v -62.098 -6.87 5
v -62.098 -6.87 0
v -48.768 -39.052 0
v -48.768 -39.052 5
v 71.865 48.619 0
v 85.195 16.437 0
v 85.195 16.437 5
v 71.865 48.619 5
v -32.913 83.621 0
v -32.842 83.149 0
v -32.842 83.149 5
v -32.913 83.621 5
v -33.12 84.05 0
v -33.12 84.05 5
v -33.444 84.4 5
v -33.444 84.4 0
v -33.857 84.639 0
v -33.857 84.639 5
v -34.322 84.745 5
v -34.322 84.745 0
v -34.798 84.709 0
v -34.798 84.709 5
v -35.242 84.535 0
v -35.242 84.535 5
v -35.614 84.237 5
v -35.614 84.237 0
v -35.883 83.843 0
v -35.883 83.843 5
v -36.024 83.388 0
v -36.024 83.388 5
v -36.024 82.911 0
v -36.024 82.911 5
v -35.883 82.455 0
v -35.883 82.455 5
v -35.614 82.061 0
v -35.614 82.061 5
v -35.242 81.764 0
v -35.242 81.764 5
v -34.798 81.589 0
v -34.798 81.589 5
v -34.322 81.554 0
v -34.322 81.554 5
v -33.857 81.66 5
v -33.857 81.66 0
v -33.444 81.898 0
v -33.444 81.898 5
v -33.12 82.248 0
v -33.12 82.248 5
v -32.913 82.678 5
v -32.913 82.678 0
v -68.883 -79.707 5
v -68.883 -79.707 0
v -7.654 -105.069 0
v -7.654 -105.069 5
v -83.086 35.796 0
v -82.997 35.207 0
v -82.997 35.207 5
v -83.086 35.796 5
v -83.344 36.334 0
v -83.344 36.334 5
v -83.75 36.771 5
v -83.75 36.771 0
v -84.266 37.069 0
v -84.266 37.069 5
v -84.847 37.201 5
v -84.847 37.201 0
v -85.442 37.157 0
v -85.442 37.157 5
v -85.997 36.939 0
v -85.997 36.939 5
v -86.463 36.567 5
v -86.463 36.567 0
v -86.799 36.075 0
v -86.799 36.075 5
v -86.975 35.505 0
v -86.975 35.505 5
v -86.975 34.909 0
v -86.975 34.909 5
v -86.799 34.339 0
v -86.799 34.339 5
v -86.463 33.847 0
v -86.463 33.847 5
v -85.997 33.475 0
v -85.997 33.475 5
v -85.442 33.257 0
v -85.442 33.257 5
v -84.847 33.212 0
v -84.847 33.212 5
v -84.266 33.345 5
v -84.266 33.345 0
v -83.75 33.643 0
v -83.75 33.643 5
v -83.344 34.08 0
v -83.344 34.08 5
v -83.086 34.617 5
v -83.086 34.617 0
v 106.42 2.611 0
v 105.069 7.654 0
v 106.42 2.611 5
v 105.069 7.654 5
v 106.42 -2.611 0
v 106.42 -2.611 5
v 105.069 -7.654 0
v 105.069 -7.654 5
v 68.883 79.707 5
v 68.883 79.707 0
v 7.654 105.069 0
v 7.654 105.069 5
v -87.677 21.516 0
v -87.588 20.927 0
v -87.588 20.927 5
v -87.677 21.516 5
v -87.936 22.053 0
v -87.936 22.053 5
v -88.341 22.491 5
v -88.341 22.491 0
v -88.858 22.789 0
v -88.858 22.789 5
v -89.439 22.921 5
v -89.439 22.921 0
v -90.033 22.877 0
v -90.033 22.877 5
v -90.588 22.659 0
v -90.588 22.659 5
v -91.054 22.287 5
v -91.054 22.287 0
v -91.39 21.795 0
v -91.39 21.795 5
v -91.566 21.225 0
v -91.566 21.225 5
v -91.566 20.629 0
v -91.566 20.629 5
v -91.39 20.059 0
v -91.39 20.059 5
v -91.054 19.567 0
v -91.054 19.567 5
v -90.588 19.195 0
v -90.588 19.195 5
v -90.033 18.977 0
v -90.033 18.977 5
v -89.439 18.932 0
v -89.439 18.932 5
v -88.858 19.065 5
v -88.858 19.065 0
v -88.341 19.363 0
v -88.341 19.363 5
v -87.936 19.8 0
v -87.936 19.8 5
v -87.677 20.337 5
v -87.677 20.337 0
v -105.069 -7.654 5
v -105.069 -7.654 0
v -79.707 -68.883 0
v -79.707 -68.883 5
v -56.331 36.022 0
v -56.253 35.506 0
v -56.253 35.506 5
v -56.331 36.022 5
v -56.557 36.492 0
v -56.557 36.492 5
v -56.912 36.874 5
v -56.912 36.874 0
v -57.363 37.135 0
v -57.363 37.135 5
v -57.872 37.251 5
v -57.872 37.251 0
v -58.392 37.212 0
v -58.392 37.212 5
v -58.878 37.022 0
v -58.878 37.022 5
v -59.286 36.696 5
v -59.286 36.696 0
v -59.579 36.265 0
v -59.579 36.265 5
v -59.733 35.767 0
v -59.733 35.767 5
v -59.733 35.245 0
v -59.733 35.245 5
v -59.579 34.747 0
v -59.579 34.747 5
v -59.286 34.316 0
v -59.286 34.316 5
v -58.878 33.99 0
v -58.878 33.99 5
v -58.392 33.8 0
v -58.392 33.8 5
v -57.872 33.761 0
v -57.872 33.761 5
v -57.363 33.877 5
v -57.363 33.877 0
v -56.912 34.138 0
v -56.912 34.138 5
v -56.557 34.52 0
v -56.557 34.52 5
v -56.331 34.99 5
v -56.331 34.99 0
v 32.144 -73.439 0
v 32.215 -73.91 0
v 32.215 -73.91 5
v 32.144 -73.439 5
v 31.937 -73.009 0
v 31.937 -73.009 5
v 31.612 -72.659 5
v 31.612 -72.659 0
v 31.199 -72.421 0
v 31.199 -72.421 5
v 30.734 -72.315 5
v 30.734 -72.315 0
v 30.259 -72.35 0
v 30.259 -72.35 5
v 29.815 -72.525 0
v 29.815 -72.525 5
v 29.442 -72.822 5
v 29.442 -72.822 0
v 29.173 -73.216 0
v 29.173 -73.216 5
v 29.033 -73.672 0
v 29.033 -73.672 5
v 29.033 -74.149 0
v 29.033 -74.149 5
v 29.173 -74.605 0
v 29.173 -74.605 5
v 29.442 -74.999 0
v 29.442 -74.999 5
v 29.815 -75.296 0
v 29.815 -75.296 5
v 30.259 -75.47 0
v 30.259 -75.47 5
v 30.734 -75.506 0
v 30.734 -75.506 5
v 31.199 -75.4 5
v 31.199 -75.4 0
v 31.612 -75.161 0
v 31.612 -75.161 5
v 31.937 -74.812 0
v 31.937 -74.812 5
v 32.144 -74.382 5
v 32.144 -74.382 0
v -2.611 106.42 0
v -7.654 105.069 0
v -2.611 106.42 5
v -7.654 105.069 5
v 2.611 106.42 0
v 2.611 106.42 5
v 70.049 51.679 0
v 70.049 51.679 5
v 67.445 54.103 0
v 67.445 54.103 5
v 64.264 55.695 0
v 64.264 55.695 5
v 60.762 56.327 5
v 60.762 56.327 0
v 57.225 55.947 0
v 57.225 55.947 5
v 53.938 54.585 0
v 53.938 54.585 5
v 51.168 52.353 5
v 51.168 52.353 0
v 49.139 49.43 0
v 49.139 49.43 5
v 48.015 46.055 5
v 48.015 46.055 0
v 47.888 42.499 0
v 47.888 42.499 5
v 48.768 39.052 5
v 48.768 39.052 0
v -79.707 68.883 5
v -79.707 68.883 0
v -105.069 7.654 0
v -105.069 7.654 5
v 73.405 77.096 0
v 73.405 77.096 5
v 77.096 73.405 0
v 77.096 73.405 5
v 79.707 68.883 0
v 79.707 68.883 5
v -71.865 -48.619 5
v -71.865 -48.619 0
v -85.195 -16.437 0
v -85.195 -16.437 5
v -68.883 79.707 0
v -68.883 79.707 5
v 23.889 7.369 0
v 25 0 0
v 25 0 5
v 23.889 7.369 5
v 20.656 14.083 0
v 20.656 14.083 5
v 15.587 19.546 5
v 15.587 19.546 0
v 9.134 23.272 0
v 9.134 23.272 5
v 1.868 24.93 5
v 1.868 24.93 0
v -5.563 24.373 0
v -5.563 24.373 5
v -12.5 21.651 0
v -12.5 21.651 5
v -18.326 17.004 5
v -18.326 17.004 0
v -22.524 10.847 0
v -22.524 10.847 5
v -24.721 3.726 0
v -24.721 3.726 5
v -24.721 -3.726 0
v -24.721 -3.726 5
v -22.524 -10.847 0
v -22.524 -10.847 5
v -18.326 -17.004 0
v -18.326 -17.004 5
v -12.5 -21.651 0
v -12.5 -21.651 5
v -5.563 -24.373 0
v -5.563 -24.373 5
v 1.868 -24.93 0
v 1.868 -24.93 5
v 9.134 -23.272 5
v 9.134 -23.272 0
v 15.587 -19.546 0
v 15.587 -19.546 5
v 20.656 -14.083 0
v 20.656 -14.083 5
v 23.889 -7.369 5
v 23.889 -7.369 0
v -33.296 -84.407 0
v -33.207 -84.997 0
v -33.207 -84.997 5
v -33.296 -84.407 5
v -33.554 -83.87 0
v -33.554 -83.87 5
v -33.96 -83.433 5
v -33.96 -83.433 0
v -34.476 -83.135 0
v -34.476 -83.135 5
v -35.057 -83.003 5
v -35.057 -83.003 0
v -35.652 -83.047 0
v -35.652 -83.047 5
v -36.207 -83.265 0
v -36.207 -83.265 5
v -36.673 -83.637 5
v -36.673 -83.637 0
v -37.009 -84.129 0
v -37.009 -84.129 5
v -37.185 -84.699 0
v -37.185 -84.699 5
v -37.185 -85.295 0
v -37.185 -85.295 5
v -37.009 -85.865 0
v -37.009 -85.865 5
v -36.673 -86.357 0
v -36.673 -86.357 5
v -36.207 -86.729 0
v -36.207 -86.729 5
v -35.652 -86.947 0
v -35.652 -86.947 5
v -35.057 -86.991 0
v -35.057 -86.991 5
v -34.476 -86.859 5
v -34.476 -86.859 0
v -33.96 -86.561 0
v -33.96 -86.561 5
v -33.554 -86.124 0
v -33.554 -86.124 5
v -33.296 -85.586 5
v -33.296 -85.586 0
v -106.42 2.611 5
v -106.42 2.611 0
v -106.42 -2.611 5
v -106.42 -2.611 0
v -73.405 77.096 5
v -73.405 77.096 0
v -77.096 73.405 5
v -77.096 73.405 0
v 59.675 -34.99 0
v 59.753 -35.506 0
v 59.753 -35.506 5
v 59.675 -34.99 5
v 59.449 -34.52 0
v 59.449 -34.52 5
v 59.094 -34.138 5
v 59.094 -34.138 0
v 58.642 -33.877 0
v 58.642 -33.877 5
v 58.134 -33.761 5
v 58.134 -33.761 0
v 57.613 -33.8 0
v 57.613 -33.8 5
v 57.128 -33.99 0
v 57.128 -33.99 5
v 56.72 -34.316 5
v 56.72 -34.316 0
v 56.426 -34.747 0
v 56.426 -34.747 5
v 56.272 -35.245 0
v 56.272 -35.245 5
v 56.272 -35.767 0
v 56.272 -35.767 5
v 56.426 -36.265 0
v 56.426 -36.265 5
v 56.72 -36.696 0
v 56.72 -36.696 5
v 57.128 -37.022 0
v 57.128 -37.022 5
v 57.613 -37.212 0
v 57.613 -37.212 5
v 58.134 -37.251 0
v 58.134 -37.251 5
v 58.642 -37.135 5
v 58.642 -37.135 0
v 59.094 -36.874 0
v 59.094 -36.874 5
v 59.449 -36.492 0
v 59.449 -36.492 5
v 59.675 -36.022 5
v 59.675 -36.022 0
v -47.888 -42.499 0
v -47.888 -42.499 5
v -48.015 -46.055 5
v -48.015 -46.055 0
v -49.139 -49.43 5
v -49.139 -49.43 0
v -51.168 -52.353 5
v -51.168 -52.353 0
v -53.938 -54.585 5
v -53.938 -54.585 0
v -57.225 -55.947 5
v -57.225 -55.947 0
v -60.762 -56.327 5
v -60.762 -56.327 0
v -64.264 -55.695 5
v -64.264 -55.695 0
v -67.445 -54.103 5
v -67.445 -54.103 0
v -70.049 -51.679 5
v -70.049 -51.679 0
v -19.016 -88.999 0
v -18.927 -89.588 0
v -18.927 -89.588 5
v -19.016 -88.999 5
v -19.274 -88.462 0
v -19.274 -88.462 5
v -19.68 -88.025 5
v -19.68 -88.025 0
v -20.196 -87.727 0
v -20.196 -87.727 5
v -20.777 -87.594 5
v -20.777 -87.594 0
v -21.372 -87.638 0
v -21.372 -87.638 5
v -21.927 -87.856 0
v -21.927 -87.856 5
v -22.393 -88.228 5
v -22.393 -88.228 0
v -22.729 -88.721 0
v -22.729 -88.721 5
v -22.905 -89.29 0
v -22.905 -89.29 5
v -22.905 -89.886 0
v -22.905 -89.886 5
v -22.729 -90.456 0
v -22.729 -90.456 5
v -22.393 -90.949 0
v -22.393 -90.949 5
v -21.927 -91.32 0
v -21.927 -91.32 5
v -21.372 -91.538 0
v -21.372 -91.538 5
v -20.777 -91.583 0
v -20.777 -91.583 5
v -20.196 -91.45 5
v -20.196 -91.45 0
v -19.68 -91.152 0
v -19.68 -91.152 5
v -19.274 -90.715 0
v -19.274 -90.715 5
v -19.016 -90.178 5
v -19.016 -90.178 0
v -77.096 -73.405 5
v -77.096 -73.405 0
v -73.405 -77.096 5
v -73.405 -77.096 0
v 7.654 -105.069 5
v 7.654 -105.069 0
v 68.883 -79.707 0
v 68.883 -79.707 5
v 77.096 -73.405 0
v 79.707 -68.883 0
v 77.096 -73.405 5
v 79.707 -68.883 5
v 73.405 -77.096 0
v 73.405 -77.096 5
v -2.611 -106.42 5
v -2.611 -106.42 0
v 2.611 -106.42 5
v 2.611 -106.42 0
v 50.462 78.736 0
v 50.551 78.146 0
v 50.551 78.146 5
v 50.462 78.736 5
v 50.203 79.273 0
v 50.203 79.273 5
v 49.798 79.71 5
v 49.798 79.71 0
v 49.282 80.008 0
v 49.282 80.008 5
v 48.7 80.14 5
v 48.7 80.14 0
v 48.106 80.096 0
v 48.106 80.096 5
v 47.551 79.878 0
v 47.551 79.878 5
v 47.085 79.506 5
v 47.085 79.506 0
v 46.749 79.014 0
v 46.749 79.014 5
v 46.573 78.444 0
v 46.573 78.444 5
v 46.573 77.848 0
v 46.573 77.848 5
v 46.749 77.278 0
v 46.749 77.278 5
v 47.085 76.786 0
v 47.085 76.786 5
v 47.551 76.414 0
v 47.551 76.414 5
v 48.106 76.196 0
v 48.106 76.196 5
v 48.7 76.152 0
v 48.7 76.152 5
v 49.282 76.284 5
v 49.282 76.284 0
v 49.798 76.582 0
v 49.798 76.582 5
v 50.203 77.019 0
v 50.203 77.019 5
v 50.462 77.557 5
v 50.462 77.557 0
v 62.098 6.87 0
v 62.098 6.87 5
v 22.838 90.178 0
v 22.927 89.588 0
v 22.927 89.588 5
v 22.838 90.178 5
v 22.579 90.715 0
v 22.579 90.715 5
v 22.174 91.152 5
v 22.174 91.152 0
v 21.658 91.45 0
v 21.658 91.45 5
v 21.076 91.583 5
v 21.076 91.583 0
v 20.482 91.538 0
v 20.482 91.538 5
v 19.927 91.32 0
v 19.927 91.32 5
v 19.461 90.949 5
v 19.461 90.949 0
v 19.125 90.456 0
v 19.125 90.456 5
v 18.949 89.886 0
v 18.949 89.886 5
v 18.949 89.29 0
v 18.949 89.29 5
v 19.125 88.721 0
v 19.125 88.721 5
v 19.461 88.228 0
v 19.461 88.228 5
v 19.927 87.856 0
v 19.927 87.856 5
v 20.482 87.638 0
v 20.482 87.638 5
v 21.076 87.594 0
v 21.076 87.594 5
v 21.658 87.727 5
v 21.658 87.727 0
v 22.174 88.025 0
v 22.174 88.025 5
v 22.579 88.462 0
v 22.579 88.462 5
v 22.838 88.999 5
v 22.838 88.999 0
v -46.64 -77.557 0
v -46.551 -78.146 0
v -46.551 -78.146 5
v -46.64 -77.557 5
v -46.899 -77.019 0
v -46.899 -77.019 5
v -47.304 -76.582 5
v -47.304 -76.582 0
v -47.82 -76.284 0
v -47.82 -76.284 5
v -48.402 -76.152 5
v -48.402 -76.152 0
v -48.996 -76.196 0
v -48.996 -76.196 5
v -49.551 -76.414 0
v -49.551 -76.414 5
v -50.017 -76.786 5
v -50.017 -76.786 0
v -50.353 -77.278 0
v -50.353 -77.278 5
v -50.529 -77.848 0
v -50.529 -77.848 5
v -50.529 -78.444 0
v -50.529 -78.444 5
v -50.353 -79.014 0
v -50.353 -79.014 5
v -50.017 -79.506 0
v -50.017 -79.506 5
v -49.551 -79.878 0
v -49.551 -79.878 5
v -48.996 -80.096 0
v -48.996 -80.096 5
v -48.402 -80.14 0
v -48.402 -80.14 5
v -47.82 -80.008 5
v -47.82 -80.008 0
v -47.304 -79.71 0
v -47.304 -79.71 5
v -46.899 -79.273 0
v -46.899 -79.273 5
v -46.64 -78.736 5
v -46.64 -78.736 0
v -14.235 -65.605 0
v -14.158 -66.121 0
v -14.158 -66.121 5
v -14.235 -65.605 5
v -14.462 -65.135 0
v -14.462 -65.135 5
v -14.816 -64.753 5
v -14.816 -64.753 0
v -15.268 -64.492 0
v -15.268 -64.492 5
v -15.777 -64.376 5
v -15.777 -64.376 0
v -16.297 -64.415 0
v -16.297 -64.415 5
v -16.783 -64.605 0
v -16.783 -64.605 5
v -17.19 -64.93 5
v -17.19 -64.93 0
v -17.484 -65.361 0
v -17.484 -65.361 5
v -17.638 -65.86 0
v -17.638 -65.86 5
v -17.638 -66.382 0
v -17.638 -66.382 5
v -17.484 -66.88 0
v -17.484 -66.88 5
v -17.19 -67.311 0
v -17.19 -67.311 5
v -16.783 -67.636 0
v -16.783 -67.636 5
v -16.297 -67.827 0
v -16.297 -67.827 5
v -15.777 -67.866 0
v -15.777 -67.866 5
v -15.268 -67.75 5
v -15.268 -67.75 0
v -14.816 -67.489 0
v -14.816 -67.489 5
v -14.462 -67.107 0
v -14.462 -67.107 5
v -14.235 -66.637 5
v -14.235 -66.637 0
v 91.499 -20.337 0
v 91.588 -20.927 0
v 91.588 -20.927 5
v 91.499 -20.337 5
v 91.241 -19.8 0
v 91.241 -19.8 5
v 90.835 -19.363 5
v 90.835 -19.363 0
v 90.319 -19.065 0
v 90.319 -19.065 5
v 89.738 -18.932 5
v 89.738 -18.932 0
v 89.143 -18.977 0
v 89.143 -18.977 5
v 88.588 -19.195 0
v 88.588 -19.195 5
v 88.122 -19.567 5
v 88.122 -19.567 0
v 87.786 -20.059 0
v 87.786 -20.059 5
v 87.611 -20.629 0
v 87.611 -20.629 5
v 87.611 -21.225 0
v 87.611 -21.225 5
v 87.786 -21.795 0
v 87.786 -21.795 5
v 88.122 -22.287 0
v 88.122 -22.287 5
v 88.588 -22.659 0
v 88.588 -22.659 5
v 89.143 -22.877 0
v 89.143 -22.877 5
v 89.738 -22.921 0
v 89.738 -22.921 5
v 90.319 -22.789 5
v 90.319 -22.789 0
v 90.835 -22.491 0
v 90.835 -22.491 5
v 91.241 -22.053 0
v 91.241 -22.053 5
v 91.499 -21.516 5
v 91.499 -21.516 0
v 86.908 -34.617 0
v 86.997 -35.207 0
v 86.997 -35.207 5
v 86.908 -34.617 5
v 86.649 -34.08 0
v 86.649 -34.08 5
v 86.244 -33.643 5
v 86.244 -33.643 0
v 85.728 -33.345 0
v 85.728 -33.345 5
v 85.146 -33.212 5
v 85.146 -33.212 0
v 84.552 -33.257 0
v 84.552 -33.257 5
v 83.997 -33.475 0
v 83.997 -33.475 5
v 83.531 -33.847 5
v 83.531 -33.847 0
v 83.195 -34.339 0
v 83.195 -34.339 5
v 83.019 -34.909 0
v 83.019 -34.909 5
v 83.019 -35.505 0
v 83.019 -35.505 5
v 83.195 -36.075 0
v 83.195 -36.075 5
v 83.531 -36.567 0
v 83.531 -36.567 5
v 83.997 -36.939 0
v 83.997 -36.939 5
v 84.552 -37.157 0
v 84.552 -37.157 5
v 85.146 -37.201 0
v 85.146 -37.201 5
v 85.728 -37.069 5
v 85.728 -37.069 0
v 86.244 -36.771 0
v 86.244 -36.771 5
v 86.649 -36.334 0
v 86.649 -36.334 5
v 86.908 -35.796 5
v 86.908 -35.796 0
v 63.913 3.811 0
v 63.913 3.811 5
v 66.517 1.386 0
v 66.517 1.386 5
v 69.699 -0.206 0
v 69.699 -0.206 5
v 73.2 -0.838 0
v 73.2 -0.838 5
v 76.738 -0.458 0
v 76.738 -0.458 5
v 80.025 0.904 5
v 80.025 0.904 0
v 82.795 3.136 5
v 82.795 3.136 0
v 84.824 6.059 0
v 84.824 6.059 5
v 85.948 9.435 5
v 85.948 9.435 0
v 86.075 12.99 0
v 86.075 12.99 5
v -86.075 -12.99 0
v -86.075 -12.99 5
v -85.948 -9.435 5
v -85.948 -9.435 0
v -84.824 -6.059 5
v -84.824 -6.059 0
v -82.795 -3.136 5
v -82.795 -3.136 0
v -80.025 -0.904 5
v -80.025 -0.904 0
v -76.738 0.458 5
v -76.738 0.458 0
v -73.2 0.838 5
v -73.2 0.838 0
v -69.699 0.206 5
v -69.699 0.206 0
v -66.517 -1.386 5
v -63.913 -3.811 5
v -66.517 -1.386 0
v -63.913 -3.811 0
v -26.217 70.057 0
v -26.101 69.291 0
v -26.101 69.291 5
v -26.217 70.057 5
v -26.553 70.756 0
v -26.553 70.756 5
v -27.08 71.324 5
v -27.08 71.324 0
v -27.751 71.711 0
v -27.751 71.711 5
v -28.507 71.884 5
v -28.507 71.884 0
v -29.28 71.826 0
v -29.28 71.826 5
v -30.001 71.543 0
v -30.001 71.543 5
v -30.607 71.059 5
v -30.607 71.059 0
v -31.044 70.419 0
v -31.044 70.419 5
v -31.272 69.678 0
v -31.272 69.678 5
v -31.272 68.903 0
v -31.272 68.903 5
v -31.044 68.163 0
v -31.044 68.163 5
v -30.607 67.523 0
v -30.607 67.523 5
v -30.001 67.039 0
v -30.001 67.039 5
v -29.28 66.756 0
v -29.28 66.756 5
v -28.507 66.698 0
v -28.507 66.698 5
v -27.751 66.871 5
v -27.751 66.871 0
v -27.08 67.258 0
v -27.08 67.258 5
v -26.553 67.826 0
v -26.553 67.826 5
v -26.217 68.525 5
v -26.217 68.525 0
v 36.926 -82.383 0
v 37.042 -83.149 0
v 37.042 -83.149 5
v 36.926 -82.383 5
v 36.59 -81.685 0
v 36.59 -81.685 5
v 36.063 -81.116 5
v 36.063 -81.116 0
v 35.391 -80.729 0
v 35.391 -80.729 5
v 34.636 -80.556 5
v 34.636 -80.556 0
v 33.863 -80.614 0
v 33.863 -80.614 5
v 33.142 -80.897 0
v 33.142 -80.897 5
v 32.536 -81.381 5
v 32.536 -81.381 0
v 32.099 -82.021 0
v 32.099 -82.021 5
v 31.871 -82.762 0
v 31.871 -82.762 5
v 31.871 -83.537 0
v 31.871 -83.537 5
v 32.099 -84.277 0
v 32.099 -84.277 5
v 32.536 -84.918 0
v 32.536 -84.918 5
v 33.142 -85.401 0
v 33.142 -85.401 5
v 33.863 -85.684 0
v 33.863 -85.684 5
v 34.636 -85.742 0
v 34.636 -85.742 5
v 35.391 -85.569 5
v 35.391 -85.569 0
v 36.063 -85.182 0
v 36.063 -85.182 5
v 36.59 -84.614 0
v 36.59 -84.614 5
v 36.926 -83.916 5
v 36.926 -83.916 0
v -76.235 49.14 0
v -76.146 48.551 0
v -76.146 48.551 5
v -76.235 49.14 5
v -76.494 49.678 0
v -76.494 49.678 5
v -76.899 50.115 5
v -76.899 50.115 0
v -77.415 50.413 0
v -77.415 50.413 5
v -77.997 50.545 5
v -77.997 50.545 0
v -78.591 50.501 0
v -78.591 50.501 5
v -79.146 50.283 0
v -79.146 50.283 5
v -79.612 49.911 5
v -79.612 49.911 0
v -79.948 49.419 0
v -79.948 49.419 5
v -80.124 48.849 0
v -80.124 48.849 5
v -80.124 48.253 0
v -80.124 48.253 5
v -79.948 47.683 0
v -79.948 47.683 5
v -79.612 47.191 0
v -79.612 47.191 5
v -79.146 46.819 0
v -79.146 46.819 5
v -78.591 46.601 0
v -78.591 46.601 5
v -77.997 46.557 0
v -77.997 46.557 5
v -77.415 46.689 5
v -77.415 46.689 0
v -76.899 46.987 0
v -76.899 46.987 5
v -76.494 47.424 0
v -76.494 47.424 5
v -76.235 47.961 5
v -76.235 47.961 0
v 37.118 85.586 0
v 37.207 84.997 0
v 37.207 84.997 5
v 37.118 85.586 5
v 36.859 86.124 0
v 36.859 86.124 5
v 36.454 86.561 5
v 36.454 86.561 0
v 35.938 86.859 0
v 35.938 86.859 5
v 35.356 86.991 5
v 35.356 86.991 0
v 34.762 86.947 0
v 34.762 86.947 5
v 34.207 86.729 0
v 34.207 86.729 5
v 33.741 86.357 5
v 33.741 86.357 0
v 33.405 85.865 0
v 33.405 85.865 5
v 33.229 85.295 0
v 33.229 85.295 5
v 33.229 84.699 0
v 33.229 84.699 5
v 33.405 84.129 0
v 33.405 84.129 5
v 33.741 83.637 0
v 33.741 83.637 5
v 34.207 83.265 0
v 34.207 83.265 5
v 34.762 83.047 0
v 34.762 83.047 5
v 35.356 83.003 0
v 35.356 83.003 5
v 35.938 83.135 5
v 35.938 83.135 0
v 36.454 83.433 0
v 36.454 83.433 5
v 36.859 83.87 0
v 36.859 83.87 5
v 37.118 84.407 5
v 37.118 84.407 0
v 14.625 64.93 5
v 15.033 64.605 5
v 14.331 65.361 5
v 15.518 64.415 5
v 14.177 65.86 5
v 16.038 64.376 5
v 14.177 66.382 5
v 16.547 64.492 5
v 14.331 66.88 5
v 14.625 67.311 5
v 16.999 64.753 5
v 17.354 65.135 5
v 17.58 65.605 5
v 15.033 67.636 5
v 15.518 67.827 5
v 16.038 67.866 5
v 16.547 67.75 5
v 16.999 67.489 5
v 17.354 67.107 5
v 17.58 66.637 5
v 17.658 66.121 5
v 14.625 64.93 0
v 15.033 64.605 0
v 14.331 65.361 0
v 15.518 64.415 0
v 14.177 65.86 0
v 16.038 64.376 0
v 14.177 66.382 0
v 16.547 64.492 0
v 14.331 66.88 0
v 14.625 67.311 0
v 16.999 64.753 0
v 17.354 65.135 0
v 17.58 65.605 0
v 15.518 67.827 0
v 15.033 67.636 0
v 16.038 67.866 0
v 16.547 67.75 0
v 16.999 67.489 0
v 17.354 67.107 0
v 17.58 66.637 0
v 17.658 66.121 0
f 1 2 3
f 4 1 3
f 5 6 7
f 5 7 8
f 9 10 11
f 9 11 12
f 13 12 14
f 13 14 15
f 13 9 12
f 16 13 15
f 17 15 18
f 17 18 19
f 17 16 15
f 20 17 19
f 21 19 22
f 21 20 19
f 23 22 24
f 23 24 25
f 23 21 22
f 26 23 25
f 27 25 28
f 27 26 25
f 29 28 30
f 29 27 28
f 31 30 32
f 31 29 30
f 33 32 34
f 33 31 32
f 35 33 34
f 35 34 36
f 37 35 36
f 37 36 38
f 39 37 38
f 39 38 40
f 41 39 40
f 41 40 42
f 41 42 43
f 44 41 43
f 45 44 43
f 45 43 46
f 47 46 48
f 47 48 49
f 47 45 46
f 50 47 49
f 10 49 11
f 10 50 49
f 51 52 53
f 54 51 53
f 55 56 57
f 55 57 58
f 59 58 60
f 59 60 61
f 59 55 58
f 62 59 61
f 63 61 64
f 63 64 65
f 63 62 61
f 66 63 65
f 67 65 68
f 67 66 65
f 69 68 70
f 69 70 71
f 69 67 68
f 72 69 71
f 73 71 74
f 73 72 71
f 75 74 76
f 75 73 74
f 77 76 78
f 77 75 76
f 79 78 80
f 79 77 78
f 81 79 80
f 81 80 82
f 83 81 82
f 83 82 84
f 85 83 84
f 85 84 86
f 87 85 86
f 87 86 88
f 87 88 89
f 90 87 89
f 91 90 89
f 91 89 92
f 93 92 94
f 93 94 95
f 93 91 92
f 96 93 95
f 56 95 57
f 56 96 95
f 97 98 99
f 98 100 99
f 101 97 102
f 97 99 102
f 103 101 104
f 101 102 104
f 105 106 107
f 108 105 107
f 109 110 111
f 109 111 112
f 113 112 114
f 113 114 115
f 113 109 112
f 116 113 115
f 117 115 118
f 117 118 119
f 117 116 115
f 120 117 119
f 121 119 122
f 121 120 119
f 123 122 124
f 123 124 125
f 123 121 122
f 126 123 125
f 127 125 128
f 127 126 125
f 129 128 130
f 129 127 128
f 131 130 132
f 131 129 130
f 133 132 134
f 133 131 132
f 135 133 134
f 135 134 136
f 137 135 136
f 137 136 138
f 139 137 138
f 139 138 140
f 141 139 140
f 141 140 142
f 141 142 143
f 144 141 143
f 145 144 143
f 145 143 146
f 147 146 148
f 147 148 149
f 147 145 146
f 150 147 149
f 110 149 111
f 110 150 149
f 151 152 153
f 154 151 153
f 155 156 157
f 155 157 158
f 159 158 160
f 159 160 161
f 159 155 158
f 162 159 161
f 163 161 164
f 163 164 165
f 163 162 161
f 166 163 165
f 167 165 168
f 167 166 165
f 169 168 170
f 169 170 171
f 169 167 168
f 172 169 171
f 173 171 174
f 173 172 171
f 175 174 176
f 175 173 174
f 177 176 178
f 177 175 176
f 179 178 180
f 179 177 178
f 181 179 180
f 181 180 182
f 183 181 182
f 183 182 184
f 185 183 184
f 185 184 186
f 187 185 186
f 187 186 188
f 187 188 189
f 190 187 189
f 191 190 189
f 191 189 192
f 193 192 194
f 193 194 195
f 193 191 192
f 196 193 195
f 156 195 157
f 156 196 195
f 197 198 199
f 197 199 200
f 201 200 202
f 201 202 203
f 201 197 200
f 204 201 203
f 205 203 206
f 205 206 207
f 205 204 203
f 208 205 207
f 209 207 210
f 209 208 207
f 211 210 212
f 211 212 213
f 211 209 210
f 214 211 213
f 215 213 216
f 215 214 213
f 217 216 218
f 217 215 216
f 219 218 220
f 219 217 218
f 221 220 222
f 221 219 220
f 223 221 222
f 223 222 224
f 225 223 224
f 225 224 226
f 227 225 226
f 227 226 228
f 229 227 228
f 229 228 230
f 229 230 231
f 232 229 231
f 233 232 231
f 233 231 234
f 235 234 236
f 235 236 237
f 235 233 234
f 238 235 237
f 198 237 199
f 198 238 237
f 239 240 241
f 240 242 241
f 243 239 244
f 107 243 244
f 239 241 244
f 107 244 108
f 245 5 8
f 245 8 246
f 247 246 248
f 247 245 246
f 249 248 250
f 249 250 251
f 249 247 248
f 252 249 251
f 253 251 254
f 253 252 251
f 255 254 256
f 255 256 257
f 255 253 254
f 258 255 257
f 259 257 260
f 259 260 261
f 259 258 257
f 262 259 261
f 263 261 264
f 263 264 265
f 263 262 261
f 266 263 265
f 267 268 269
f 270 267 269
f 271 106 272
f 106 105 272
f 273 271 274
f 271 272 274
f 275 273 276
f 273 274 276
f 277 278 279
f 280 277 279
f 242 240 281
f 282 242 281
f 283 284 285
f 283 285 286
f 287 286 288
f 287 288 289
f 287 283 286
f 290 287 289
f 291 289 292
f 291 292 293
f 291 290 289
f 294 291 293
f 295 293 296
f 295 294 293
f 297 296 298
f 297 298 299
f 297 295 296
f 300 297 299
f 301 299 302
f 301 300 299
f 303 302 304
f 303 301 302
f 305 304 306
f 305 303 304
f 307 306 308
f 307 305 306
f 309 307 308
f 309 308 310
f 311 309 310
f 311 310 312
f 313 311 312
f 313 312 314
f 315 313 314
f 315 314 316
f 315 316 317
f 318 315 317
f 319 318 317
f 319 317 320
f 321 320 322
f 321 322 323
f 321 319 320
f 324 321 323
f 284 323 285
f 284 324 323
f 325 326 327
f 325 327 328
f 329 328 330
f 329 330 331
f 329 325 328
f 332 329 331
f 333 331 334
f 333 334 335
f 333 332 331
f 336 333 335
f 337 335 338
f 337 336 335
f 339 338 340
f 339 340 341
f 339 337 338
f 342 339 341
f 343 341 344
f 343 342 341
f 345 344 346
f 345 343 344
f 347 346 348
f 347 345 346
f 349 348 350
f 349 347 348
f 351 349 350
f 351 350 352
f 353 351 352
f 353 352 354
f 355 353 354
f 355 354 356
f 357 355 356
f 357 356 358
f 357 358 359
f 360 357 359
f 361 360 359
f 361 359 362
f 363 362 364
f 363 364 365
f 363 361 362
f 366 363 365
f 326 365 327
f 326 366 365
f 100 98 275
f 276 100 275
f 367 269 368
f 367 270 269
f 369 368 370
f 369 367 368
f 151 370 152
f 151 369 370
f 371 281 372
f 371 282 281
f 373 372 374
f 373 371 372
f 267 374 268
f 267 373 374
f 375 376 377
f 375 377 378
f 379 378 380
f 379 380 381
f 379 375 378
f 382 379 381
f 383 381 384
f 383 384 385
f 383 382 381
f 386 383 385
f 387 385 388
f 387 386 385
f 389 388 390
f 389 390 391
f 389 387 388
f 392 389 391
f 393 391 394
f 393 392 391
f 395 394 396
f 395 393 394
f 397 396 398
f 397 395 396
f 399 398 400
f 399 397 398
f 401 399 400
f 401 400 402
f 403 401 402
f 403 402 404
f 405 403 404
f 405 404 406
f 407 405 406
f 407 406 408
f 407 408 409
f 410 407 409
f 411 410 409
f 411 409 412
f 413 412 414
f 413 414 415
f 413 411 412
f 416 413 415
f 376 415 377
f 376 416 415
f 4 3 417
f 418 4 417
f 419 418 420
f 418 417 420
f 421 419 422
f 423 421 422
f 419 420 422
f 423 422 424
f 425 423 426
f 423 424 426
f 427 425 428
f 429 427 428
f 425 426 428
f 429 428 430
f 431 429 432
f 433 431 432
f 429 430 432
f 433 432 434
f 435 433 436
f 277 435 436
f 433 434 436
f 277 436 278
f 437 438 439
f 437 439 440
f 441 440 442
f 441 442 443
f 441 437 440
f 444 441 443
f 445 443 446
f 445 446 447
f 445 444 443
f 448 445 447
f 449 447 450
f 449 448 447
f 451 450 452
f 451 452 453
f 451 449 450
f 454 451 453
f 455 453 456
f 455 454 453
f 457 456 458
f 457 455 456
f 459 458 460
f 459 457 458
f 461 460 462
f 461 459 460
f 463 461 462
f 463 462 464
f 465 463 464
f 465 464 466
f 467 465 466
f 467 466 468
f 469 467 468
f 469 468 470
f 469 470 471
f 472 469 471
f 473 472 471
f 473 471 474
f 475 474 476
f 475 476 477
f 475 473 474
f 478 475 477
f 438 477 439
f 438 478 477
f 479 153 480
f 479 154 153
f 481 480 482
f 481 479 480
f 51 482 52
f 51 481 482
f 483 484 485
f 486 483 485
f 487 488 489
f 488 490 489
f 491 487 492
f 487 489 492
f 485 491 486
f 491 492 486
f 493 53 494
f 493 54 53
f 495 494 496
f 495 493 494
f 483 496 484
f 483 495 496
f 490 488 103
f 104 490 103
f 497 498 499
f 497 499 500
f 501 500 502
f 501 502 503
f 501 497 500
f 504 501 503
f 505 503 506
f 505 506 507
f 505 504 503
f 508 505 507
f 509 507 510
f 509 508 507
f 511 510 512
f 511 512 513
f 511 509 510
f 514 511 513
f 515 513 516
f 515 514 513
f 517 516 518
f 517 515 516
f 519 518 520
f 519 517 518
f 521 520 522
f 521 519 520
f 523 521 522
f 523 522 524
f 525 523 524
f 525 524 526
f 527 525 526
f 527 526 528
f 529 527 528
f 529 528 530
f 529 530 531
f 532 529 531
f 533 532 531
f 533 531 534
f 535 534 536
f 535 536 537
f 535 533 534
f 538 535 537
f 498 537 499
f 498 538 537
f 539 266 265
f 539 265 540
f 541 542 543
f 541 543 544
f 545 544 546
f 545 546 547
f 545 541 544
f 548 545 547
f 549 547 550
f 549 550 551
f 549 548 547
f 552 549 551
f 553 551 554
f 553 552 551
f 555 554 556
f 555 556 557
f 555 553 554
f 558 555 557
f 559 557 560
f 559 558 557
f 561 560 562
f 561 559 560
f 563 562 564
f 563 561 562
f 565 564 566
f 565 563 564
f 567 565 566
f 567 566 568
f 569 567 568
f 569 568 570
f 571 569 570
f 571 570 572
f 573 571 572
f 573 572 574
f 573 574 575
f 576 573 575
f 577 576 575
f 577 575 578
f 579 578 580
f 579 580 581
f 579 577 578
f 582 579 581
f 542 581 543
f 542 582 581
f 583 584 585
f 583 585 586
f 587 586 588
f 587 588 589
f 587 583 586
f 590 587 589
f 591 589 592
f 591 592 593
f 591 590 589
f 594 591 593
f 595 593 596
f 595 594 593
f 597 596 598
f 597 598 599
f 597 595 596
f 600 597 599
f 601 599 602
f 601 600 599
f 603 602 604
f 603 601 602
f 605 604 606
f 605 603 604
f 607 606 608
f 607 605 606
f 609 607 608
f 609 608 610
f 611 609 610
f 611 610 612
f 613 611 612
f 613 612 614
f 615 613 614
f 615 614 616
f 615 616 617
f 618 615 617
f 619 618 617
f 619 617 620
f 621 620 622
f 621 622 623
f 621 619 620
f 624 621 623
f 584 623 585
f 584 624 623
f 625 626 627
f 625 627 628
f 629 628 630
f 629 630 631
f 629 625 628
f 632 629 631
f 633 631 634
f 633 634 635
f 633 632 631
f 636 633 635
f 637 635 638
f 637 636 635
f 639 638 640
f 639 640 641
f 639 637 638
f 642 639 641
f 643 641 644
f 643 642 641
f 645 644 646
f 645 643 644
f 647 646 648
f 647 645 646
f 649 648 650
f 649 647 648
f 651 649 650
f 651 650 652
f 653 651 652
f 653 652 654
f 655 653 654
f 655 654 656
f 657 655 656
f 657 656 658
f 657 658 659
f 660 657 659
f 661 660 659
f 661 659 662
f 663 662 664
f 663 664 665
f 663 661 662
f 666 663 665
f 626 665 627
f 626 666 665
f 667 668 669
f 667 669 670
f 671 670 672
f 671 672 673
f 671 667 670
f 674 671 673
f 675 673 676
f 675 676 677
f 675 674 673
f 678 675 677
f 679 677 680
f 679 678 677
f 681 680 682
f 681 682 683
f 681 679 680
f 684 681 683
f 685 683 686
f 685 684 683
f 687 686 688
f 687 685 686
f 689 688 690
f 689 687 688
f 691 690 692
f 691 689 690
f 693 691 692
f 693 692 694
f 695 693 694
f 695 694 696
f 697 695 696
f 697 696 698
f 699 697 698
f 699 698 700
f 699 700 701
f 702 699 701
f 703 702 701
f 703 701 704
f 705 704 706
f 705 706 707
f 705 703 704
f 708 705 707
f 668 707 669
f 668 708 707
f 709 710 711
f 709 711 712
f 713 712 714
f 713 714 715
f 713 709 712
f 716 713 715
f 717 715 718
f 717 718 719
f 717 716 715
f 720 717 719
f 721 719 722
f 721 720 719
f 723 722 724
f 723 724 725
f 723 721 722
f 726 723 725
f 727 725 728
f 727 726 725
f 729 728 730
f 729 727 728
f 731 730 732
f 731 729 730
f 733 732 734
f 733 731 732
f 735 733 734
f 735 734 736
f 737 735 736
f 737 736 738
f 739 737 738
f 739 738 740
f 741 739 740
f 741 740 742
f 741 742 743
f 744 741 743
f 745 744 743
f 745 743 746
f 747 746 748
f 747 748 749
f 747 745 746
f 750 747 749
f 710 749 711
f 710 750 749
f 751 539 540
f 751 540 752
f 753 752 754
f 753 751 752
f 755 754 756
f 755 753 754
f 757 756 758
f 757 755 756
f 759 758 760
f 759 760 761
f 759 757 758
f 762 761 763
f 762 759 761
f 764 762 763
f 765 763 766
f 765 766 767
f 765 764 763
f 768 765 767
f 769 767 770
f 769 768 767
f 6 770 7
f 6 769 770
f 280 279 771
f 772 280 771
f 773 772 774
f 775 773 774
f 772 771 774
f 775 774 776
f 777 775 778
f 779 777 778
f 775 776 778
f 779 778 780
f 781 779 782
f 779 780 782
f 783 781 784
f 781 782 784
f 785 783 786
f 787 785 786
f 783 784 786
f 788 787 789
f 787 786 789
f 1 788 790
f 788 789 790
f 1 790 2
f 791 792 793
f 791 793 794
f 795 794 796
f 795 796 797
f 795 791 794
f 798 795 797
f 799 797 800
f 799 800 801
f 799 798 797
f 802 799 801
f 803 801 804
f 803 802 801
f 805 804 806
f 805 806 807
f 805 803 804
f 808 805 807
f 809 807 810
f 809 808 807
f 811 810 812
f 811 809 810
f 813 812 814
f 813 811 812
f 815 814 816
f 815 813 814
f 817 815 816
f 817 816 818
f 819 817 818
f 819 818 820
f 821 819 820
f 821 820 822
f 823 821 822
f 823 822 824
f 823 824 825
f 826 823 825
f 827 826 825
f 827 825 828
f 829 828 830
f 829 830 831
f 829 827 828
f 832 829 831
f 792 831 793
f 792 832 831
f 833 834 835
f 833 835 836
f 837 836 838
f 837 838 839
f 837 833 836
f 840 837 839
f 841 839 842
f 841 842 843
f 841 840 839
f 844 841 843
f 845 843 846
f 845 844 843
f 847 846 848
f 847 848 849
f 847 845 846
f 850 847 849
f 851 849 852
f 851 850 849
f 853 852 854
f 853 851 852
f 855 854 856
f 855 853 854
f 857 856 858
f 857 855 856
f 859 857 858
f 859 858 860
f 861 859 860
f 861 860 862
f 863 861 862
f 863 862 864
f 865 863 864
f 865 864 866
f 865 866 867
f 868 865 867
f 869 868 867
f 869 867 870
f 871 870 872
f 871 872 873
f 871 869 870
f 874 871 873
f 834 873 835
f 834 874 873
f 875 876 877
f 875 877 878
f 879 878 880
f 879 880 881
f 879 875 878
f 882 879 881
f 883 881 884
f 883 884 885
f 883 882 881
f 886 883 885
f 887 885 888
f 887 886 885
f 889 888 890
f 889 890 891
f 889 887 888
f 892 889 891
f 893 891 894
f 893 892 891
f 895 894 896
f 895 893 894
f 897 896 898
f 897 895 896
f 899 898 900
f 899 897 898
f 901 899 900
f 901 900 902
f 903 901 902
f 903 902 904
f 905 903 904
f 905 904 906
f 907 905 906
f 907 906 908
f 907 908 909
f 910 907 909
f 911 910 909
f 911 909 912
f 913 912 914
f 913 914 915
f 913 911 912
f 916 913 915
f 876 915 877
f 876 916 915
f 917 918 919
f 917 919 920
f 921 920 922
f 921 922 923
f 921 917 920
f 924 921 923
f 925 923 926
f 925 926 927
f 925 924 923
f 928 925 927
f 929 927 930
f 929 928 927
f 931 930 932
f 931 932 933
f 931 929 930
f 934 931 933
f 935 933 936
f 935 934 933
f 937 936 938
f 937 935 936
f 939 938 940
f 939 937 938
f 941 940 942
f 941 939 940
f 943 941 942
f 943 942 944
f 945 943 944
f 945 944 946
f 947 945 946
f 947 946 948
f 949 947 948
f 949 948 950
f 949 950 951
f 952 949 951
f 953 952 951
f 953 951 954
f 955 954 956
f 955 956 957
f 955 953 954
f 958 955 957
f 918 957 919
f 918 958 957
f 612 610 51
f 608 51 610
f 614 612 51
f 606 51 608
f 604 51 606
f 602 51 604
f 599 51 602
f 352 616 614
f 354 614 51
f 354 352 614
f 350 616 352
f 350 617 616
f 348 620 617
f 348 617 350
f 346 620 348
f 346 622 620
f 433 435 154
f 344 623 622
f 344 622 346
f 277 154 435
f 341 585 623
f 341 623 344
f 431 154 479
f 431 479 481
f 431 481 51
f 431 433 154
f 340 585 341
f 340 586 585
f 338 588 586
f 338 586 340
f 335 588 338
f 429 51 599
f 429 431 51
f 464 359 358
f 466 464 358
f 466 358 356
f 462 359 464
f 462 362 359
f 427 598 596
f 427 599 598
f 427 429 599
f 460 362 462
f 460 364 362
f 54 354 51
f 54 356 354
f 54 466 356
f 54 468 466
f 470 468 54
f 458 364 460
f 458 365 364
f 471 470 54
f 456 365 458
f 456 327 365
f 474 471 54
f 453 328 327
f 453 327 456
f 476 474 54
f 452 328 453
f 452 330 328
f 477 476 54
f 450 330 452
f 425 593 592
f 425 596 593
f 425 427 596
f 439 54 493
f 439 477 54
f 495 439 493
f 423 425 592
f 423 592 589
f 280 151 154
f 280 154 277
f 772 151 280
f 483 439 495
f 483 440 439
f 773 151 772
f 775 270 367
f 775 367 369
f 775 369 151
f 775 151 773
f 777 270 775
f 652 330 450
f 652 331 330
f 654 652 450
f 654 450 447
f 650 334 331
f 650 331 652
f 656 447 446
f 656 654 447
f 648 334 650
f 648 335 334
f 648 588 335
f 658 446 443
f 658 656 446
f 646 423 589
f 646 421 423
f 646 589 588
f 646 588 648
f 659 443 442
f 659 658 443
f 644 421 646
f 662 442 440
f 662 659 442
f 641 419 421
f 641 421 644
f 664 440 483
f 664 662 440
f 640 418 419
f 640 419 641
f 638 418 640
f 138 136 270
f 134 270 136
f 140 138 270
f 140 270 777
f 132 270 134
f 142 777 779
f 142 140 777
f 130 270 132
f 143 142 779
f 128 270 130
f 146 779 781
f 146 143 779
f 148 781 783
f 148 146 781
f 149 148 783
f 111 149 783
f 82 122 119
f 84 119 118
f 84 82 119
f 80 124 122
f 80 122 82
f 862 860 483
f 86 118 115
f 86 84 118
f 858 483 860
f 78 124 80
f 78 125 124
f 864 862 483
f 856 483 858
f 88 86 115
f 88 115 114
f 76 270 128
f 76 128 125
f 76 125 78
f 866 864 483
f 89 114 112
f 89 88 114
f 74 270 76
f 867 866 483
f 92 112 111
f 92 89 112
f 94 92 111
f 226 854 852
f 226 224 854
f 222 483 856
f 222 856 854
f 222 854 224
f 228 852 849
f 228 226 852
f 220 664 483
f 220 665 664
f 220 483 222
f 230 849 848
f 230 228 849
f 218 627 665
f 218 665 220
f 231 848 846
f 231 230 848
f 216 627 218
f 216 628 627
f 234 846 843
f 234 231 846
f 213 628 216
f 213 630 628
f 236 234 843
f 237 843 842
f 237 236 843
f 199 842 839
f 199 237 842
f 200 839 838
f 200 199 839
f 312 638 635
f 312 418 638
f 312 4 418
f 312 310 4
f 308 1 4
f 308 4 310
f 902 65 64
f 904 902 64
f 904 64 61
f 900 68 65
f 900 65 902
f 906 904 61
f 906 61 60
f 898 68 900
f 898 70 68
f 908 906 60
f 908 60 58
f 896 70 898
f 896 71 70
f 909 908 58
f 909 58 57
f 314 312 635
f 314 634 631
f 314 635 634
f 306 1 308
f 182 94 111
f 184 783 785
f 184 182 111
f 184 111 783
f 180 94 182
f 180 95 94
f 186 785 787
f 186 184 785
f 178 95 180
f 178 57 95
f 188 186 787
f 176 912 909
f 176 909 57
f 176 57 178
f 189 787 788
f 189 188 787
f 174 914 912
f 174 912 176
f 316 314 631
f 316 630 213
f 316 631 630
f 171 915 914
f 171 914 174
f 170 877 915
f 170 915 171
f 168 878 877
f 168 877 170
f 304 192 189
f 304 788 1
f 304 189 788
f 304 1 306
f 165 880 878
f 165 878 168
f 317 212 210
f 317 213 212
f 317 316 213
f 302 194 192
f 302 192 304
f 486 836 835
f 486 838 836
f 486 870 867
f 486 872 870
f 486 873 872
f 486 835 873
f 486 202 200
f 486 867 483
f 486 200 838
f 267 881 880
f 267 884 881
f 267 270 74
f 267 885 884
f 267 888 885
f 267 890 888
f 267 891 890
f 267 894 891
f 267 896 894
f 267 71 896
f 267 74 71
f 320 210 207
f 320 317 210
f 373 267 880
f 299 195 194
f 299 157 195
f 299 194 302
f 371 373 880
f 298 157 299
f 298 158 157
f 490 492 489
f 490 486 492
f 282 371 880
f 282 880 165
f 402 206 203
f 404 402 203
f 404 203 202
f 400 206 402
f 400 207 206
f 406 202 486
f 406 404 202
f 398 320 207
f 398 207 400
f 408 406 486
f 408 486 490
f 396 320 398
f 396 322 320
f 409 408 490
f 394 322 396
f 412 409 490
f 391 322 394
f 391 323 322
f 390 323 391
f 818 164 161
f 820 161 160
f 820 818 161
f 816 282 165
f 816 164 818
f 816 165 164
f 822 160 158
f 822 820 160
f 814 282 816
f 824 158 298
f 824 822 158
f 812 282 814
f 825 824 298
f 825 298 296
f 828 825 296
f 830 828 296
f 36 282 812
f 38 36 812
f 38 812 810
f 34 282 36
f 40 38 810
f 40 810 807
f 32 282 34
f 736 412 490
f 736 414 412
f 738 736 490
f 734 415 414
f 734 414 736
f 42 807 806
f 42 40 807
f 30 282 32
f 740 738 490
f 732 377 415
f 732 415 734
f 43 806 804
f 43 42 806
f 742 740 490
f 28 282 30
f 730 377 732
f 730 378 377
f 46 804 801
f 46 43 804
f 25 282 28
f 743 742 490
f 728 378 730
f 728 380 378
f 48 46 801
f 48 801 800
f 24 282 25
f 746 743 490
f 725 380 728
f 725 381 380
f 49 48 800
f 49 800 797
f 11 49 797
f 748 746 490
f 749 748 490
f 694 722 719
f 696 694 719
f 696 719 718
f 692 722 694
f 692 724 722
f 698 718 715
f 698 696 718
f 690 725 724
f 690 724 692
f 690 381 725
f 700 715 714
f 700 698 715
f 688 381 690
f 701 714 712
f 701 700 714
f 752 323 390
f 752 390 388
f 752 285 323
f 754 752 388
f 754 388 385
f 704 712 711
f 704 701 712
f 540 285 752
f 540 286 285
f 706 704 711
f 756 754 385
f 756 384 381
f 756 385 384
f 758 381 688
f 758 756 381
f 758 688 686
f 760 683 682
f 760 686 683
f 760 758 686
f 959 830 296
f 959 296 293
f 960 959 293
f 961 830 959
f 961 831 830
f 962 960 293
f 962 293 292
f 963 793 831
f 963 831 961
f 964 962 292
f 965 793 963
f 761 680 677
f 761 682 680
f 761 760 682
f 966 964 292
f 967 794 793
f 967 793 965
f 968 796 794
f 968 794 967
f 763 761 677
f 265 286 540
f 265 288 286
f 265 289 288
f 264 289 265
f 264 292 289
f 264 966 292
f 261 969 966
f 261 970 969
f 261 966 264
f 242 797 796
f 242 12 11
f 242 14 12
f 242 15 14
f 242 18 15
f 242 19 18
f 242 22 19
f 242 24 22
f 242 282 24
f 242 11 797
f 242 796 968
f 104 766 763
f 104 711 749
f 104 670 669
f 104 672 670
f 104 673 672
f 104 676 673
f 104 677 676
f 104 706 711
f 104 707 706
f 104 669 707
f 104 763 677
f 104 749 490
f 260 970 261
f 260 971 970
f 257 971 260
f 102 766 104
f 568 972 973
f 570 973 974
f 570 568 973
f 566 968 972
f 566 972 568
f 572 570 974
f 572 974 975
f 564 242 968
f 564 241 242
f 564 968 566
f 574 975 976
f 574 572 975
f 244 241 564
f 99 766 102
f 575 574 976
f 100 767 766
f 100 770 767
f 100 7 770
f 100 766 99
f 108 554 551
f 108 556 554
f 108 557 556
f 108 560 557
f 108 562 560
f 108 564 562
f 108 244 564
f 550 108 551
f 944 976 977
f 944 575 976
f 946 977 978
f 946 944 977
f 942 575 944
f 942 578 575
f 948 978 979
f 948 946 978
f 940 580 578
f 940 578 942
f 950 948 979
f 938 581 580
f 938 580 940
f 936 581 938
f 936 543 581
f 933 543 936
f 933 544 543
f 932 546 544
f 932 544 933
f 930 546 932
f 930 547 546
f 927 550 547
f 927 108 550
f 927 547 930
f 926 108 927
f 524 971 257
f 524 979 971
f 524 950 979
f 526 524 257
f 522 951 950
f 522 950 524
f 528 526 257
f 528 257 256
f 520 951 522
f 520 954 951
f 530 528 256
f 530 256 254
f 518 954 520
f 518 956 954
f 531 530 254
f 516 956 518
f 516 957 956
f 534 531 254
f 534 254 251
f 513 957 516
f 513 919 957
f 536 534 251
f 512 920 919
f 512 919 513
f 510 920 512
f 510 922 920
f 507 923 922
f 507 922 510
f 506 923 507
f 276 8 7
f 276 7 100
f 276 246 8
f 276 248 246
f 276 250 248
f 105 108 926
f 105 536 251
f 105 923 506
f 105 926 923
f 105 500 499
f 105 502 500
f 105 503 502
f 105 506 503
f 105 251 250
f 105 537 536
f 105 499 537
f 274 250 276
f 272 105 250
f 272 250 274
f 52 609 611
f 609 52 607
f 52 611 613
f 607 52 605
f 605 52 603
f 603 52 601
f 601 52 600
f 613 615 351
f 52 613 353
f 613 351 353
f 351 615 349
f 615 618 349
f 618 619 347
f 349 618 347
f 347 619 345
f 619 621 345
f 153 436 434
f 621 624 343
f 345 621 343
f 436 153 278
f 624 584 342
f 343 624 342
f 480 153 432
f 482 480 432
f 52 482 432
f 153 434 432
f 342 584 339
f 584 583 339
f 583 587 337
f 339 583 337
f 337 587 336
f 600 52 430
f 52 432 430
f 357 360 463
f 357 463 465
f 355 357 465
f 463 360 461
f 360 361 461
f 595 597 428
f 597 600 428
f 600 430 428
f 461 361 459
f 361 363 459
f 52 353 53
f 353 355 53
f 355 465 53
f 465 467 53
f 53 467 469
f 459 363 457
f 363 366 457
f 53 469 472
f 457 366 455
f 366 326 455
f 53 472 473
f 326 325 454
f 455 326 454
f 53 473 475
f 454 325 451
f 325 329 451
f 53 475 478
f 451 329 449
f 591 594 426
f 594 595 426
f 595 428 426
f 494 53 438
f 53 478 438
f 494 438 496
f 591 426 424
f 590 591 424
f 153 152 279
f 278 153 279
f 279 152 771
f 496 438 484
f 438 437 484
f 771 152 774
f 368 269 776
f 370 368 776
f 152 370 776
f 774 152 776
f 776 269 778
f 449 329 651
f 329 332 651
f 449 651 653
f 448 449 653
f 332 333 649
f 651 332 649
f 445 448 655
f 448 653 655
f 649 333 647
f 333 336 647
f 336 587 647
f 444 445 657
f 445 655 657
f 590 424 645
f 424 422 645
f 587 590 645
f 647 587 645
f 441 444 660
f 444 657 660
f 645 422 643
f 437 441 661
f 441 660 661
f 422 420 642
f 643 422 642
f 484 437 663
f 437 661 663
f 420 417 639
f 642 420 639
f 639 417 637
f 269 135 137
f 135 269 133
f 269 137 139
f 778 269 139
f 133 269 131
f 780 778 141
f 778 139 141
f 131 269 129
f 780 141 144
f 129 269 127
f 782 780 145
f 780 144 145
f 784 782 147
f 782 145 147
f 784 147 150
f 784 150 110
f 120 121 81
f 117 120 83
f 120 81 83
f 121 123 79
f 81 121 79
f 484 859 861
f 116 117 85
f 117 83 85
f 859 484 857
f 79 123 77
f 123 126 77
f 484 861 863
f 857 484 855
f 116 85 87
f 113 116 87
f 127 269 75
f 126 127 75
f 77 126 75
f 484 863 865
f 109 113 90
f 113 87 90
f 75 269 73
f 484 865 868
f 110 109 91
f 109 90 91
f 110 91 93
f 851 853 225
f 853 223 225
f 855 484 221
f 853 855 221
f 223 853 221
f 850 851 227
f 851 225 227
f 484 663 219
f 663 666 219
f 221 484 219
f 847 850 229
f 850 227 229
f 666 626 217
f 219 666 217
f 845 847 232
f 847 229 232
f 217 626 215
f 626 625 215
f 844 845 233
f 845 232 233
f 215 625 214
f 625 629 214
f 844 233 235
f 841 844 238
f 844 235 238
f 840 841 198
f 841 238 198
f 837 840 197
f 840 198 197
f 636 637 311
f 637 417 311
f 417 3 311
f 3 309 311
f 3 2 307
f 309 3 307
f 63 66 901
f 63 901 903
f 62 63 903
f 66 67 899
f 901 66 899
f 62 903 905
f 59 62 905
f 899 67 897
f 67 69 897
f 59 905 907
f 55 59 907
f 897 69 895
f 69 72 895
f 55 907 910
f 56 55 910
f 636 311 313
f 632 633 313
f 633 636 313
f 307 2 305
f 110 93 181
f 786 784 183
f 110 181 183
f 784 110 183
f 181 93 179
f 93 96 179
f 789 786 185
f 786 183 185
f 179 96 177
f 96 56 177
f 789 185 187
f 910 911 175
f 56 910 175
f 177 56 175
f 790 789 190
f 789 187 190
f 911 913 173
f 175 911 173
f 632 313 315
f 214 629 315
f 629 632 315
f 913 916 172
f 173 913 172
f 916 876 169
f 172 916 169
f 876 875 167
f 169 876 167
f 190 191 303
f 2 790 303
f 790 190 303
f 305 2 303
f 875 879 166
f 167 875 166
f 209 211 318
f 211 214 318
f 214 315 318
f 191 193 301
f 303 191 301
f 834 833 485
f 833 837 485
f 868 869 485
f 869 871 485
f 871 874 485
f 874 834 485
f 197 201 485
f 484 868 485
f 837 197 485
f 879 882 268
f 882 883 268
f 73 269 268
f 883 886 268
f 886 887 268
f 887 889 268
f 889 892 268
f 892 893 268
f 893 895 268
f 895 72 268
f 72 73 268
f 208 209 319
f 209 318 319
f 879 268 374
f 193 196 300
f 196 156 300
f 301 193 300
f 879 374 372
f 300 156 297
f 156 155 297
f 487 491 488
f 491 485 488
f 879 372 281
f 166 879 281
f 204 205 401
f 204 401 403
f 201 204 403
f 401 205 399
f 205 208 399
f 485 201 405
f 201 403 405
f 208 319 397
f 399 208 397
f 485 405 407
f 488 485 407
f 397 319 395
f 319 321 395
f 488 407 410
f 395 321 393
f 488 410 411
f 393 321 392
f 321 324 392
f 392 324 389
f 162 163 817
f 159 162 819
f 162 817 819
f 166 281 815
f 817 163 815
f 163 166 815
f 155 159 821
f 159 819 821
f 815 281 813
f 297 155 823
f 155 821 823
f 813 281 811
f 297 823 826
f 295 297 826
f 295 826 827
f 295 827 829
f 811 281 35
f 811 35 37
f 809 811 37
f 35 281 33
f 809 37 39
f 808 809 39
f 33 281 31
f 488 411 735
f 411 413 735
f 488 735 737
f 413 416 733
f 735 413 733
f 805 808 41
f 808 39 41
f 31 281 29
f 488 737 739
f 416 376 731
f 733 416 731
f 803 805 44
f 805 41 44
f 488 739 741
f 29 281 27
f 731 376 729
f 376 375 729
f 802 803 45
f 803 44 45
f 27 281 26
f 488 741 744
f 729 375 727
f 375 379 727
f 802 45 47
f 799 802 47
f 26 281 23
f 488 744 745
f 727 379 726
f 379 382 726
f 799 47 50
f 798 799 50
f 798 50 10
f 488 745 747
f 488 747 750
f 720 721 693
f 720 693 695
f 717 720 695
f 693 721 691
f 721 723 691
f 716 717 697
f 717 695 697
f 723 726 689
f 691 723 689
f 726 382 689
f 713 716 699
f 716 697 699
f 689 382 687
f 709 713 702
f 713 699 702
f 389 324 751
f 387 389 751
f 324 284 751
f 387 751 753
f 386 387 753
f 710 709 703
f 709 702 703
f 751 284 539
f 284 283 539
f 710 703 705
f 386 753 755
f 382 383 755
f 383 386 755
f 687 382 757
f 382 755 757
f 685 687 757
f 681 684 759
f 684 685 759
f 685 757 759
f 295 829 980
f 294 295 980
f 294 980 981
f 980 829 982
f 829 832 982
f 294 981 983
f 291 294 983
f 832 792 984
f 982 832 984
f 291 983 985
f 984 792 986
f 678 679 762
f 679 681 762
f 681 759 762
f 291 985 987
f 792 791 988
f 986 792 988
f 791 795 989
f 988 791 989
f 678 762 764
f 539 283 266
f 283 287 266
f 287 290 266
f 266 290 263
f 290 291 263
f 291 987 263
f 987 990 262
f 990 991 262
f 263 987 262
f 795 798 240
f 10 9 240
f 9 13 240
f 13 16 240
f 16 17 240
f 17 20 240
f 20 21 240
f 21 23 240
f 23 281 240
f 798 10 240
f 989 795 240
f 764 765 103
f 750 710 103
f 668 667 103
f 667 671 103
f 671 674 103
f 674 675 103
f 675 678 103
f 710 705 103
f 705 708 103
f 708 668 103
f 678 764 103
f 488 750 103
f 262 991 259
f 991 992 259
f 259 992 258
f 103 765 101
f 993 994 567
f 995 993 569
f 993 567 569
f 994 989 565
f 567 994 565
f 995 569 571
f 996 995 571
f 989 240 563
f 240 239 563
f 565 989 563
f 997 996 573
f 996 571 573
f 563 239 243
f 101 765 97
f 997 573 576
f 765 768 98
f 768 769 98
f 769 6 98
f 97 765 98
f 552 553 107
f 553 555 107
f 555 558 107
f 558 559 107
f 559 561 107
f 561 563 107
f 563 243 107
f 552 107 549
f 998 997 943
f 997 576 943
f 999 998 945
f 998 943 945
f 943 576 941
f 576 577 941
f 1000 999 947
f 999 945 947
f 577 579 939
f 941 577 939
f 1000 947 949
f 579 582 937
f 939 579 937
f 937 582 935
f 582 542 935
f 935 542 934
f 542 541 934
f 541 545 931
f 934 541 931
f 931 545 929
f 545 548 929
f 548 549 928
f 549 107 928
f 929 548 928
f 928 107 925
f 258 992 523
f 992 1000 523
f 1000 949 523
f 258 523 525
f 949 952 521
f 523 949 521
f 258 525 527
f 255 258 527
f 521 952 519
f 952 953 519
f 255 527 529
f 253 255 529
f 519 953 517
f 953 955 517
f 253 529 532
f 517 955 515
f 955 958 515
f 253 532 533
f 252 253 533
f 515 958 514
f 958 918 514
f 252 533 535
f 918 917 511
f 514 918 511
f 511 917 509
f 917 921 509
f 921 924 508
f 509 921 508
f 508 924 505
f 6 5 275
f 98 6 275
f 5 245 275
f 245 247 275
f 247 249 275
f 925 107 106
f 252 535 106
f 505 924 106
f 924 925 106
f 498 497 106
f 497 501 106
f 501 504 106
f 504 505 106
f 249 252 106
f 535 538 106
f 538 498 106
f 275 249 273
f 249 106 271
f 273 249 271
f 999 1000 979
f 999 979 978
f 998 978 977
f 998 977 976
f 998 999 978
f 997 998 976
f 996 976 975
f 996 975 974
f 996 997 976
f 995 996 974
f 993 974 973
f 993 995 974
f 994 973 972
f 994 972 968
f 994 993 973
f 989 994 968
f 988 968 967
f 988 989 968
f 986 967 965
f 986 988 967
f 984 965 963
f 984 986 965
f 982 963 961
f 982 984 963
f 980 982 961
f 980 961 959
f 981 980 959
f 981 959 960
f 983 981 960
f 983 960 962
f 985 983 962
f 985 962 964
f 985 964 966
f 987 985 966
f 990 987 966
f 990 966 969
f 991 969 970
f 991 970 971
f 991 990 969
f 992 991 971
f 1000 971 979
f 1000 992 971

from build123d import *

# Parameters (mm, degrees)
SKETCH_1_R      = 2
SKETCH_1_R_2    = 1.75
SKETCH_1_R_3    = 25
SKETCH_1_R_4    = 1.6
SKETCH_1_R_5    = 2.6
EXTRUDE_1_DEPTH = 5
FILLET_1_R      = 20


with BuildPart() as part:
    # 草图1 → 凸台-拉伸1 (new body)
    with BuildSketch(Plane.XY):
        Polygon((0, 108.239220029), (-76.536686473, 76.536686473), (-108.239220029, 0), (-76.536686473, -76.536686473), (0, -108.239220029), (76.536686473, -76.536686473), (108.239220029, 0), (76.536686473, 76.536686473), align=None)
        with Locations((-35.206875778, -84.996916991)):
            Circle(SKETCH_1_R, mode=Mode.SUBTRACT)
        with Locations((84.996916991, -35.206875778)):
            Circle(SKETCH_1_R, mode=Mode.SUBTRACT)
        with Locations((35.206875778, 84.996916991)):
            Circle(SKETCH_1_R, mode=Mode.SUBTRACT)
        with Locations((-84.996916991, 35.206875778)):
            Circle(SKETCH_1_R, mode=Mode.SUBTRACT)
        with Locations((-58.002770081, 35.506036994)):
            Circle(SKETCH_1_R_2, mode=Mode.SUBTRACT)
        with Locations((-15.90759252, -66.120711583)):
            Circle(SKETCH_1_R_2, mode=Mode.SUBTRACT)
        with Locations((58.002770081, -35.506036994)):
            Circle(SKETCH_1_R_2, mode=Mode.SUBTRACT)
        with Locations((15.90759252, 66.120711583)):
            Circle(SKETCH_1_R_2, mode=Mode.SUBTRACT)
        with Locations((89.588318422, -20.926853617)):
            Circle(SKETCH_1_R, mode=Mode.SUBTRACT)
        with Locations((-20.926853617, -89.588318422)):
            Circle(SKETCH_1_R, mode=Mode.SUBTRACT)
        with Locations((-89.588318422, 20.926853617)):
            Circle(SKETCH_1_R, mode=Mode.SUBTRACT)
        with Locations((20.926853617, 89.588318422)):
            Circle(SKETCH_1_R, mode=Mode.SUBTRACT)
        with Locations((-48.55098737, -78.146027573)):
            Circle(SKETCH_1_R, mode=Mode.SUBTRACT)
        with Locations((-78.146027573, 48.55098737)):
            Circle(SKETCH_1_R, mode=Mode.SUBTRACT)
        with Locations((48.55098737, 78.146027573)):
            Circle(SKETCH_1_R, mode=Mode.SUBTRACT)
        Circle(SKETCH_1_R_3, mode=Mode.SUBTRACT)
        with Locations((-34.441508913, 83.149157926)):
            Circle(SKETCH_1_R_4, mode=Mode.SUBTRACT)
        with Locations((-28.701257427, 69.290964938)):
            Circle(SKETCH_1_R_5, mode=Mode.SUBTRACT)
        with Locations((30.614674589, -73.910362601)):
            Circle(SKETCH_1_R_4, mode=Mode.SUBTRACT)
        with Locations((34.441508913, -83.149157926)):
            Circle(SKETCH_1_R_5, mode=Mode.SUBTRACT)
        with BuildLine():
            Line((-62.097714236, -6.870411885), (-48.767829666, -39.051599999))
            ThreePointArc((-48.767829666, -39.051599999), (-55.532780918, -55.38363706), (-71.864817978, -48.618685808))
            Line((-71.864817978, -48.618685808), (-85.194702548, -16.437497694))
            ThreePointArc((-85.194702548, -16.437497694), (-78.429751297, -0.105460633), (-62.097714236, -6.870411885))
        make_face(mode=Mode.SUBTRACT)
        with BuildLine():
            Line((48.767829666, 39.051599999), (62.097714236, 6.870411885))
            ThreePointArc((62.097714236, 6.870411885), (78.429751297, 0.105460633), (85.194702548, 16.437497694))
            Line((85.194702548, 16.437497694), (71.864817978, 48.618685808))
            ThreePointArc((71.864817978, 48.618685808), (55.532780918, 55.38363706), (48.767829666, 39.051599999))
        make_face(mode=Mode.SUBTRACT)
    extrude(amount=EXTRUDE_1_DEPTH)

    # 圆角1
    fillet_1_edges = [part.edges().sort_by_distance(p)[0] for p in [
        (76.536686473, 76.536686473, 2.5),
        (108.239220029, 0, 2.5),
        (76.536686473, -76.536686473, 2.5),
        (0, -108.239220029, 2.5),
        (-76.536686473, -76.536686473, 2.5),
        (-108.239220029, 0, 2.5),
        (-76.536686473, 76.536686473, 2.5),
        (0, 108.239220029, 2.5),
    ]]
    fillet(fillet_1_edges, radius=FILLET_1_R)


solid = part.part
